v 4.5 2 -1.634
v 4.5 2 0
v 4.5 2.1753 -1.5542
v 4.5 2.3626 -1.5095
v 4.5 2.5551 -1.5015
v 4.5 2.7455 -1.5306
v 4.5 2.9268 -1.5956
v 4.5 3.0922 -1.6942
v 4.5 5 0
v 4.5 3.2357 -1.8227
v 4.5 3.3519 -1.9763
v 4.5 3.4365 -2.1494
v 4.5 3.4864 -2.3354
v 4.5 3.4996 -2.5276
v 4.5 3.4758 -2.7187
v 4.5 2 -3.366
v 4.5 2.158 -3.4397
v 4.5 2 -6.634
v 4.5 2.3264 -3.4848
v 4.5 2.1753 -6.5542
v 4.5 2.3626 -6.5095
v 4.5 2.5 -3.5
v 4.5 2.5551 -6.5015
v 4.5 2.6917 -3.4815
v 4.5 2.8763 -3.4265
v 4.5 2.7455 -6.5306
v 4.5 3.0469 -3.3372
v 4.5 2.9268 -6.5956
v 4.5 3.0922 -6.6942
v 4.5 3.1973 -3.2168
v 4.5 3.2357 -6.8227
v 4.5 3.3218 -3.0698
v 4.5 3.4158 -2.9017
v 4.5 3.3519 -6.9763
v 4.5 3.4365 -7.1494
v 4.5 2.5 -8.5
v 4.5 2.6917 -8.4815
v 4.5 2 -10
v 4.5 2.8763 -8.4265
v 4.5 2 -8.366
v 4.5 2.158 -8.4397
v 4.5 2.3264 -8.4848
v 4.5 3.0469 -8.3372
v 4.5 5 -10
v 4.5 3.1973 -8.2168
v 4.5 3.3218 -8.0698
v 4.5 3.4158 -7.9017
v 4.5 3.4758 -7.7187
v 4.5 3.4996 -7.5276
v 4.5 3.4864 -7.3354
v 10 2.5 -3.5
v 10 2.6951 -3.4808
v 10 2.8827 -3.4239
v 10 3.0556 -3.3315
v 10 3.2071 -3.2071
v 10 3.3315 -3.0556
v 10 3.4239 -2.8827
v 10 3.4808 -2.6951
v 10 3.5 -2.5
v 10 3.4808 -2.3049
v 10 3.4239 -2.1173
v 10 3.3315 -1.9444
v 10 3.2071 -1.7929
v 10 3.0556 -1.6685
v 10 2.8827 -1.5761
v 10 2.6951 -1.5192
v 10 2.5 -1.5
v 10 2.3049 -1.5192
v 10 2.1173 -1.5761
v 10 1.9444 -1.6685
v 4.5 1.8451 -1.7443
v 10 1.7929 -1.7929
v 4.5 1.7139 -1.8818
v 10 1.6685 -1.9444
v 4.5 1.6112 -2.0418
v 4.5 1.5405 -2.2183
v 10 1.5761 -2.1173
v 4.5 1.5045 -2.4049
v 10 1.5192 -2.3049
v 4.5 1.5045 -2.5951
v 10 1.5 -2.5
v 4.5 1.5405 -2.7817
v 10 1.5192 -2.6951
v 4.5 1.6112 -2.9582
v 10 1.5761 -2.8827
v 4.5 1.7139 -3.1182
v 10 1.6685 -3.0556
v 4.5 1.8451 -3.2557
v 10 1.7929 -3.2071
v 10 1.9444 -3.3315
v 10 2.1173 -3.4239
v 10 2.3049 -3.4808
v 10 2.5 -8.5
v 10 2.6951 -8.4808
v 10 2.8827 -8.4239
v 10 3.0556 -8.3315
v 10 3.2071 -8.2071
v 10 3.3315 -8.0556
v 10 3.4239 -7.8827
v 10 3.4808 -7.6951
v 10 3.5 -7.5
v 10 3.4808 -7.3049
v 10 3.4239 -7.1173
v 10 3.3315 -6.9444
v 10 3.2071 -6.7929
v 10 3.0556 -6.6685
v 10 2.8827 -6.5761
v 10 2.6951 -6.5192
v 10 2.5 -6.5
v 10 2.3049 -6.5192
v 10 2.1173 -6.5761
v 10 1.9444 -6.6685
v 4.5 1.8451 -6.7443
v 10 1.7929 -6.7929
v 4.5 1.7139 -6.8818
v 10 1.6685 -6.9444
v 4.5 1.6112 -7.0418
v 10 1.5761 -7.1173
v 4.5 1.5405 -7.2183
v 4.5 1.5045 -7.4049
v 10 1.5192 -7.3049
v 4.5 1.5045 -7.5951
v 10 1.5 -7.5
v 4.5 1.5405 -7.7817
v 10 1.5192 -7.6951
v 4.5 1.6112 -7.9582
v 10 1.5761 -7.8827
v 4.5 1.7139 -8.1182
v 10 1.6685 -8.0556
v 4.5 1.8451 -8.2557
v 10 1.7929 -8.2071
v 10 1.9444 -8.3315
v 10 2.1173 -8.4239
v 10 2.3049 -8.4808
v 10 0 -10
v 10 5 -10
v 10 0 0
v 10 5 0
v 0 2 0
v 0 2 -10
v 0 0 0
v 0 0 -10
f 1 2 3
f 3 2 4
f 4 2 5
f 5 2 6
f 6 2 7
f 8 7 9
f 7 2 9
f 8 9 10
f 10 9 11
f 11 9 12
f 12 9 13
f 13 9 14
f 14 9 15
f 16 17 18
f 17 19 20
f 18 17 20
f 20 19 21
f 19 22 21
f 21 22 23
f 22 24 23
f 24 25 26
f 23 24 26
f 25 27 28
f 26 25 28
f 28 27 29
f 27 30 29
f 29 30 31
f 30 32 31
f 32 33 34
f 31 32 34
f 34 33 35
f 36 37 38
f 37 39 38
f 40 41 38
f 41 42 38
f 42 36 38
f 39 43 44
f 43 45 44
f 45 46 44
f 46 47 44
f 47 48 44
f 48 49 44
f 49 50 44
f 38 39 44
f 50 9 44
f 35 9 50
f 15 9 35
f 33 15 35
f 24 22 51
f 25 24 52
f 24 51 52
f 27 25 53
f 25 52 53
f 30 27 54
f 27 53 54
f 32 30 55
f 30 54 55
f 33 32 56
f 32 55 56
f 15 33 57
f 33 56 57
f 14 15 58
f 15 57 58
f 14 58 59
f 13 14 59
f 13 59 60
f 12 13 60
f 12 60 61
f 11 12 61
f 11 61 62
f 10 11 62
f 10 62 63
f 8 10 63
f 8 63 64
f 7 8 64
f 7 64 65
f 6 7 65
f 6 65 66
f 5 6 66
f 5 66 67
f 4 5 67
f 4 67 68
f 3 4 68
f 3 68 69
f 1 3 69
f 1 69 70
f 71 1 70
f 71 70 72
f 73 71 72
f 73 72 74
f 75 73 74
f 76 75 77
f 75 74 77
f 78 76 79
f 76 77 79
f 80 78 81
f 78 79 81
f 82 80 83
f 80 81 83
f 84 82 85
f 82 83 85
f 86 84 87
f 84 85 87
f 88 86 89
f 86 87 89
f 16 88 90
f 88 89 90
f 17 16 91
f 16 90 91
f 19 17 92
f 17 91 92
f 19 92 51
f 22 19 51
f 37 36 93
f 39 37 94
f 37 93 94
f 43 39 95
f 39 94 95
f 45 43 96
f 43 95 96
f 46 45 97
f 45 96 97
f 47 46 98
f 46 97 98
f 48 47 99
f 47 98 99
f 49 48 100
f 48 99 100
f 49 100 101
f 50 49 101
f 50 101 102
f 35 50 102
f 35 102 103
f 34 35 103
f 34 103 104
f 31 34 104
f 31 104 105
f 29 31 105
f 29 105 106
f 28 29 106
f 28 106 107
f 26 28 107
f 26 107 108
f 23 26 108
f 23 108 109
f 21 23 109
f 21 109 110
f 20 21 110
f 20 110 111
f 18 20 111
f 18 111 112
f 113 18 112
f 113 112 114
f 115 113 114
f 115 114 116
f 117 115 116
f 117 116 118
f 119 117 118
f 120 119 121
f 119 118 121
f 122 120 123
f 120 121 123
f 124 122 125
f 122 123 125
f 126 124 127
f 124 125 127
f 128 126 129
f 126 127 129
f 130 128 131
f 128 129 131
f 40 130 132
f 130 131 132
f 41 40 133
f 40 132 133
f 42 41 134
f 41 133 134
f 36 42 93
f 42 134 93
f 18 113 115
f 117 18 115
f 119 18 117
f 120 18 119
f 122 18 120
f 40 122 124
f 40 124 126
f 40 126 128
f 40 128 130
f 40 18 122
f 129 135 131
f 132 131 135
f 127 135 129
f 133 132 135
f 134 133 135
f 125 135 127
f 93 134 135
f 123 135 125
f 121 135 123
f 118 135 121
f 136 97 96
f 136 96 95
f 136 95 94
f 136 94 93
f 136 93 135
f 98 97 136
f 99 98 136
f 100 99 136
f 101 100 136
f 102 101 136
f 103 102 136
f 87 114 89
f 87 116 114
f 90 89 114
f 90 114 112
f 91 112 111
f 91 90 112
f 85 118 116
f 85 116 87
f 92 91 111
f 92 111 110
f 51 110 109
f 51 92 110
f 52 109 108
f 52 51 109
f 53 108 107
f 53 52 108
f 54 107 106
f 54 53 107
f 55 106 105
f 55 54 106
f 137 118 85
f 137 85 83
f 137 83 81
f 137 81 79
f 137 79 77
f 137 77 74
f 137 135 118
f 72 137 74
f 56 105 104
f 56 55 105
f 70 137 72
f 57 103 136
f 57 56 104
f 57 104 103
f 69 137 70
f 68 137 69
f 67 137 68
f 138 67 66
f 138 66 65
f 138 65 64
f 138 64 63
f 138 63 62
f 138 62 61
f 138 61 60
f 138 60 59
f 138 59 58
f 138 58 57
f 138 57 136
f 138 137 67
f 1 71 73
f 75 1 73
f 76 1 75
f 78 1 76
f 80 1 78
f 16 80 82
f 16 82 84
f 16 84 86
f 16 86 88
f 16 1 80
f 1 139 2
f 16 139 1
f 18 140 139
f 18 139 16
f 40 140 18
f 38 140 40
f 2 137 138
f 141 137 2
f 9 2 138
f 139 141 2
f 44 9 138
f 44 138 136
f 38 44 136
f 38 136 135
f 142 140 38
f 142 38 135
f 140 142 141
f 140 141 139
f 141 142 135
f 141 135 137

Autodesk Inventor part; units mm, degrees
ref_plane "YZ Plane" through (0, 0, 0) normal (1, 0, 0) x (0, 1, 0)
ref_plane "XZ Plane" through (0, 0, 0) normal (0, 1, 0) x (-1, 0, 0)
ref_plane "XY Plane" through (0, 0, 0) normal (0, 0, 1) x (1, 0, 0)
sketch "Sketch1" plane through (0, 0, 0) normal (1, 0, 0) x (0, 1, 0)
  line L0 (0, 0) -> (5, 0)
  line L1 (5, 0) -> (5, -10)
  line L2 (5, -10) -> (0, -10)
  line L3 (0, -10) -> (0, 0)
  dimension "d0" = 5
  dimension "d1" = 10
extrude "Extrusion1" add sketch "Sketch1" along normal blind 10
sketch "Sketch2" plane through (0, 5, 0) normal (0, 1, 0) x (1, 0, 0)
  line L0 (0, 0) -> (10, 0) projected
  line L1 (0, 10) -> (10, 10) projected
  line L2 (10, 0) -> (6.5, 0)
  line L3 (6.5, 0) -> (6.5, 10)
  line L4 (6.5, 10) -> (10, 10)
  line L5 (10, 10) -> (10, 0)
  line L6 (6.5, 0) -> (4.5, 0)
  line L7 (4.5, 0) -> (4.5, 10)
  line L8 (4.5, 10) -> (6.5, 10)
  line L9 (6.5, 10) -> (6.5, 0)
  line L10 (4.5, 10) -> (2, 10)
  line L11 (2, 10) -> (2, 0)
  line L12 (2, 0) -> (4.5, 0)
  line L13 (4.5, 0) -> (4.5, 10)
  line L14 (0, 10) -> (0, 0) projected
  line L15 (2, 0) -> (0, 0)
  line L16 (0, 0) -> (0, 10)
  line L17 (0, 10) -> (2, 10)
  line L18 (2, 10) -> (2, 0)
  dimension "d4" = 3.5
  dimension "d5" = 2
  dimension "d6" = 2.5
extrude "Extrusion2" cut sketch "Sketch2" against normal blind 3 contours L14 L1 L11 L0 | L11 L1 L7 L0
sketch "Sketch3" plane through (10, 0, 0) normal (1, 0, 0) x (0, 0, -1)
  line L0 (10, 5) -> (0, 5) projected
  line L1 (0, 5) -> (2.5, 5)
  line L2 (2.5, 5) -> (2.5, 2.5)
  line L3 (2.5, 2.5) -> (0, 2.5)
  line L4 (0, 2.5) -> (0, 5)
  line L5 (10, 5) -> (7.5, 5)
  line L6 (7.5, 5) -> (7.5, 2.5)
  line L7 (7.5, 2.5) -> (10, 2.5)
  line L8 (10, 2.5) -> (10, 5)
  circle A0 centre (2.5, 2.5) radius 1
  circle A1 centre (7.5, 2.5) radius 1
  point P0 (0, 0)
  dimension "d9" = 2.5
  dimension "d10" = 2.5
  dimension "d11" = 2.5
  dimension "d12" = 2.5
  dimension "d13" = 2
  dimension "d14" = 2
extrude "Extrusion3" cut sketch "Sketch3" against normal blind 5.5 contours A1 L7 L6 | L6 L7 A1 | A0 L3 L2 | L2 L3 A0
properties part number "suport2_pcb_temp"
